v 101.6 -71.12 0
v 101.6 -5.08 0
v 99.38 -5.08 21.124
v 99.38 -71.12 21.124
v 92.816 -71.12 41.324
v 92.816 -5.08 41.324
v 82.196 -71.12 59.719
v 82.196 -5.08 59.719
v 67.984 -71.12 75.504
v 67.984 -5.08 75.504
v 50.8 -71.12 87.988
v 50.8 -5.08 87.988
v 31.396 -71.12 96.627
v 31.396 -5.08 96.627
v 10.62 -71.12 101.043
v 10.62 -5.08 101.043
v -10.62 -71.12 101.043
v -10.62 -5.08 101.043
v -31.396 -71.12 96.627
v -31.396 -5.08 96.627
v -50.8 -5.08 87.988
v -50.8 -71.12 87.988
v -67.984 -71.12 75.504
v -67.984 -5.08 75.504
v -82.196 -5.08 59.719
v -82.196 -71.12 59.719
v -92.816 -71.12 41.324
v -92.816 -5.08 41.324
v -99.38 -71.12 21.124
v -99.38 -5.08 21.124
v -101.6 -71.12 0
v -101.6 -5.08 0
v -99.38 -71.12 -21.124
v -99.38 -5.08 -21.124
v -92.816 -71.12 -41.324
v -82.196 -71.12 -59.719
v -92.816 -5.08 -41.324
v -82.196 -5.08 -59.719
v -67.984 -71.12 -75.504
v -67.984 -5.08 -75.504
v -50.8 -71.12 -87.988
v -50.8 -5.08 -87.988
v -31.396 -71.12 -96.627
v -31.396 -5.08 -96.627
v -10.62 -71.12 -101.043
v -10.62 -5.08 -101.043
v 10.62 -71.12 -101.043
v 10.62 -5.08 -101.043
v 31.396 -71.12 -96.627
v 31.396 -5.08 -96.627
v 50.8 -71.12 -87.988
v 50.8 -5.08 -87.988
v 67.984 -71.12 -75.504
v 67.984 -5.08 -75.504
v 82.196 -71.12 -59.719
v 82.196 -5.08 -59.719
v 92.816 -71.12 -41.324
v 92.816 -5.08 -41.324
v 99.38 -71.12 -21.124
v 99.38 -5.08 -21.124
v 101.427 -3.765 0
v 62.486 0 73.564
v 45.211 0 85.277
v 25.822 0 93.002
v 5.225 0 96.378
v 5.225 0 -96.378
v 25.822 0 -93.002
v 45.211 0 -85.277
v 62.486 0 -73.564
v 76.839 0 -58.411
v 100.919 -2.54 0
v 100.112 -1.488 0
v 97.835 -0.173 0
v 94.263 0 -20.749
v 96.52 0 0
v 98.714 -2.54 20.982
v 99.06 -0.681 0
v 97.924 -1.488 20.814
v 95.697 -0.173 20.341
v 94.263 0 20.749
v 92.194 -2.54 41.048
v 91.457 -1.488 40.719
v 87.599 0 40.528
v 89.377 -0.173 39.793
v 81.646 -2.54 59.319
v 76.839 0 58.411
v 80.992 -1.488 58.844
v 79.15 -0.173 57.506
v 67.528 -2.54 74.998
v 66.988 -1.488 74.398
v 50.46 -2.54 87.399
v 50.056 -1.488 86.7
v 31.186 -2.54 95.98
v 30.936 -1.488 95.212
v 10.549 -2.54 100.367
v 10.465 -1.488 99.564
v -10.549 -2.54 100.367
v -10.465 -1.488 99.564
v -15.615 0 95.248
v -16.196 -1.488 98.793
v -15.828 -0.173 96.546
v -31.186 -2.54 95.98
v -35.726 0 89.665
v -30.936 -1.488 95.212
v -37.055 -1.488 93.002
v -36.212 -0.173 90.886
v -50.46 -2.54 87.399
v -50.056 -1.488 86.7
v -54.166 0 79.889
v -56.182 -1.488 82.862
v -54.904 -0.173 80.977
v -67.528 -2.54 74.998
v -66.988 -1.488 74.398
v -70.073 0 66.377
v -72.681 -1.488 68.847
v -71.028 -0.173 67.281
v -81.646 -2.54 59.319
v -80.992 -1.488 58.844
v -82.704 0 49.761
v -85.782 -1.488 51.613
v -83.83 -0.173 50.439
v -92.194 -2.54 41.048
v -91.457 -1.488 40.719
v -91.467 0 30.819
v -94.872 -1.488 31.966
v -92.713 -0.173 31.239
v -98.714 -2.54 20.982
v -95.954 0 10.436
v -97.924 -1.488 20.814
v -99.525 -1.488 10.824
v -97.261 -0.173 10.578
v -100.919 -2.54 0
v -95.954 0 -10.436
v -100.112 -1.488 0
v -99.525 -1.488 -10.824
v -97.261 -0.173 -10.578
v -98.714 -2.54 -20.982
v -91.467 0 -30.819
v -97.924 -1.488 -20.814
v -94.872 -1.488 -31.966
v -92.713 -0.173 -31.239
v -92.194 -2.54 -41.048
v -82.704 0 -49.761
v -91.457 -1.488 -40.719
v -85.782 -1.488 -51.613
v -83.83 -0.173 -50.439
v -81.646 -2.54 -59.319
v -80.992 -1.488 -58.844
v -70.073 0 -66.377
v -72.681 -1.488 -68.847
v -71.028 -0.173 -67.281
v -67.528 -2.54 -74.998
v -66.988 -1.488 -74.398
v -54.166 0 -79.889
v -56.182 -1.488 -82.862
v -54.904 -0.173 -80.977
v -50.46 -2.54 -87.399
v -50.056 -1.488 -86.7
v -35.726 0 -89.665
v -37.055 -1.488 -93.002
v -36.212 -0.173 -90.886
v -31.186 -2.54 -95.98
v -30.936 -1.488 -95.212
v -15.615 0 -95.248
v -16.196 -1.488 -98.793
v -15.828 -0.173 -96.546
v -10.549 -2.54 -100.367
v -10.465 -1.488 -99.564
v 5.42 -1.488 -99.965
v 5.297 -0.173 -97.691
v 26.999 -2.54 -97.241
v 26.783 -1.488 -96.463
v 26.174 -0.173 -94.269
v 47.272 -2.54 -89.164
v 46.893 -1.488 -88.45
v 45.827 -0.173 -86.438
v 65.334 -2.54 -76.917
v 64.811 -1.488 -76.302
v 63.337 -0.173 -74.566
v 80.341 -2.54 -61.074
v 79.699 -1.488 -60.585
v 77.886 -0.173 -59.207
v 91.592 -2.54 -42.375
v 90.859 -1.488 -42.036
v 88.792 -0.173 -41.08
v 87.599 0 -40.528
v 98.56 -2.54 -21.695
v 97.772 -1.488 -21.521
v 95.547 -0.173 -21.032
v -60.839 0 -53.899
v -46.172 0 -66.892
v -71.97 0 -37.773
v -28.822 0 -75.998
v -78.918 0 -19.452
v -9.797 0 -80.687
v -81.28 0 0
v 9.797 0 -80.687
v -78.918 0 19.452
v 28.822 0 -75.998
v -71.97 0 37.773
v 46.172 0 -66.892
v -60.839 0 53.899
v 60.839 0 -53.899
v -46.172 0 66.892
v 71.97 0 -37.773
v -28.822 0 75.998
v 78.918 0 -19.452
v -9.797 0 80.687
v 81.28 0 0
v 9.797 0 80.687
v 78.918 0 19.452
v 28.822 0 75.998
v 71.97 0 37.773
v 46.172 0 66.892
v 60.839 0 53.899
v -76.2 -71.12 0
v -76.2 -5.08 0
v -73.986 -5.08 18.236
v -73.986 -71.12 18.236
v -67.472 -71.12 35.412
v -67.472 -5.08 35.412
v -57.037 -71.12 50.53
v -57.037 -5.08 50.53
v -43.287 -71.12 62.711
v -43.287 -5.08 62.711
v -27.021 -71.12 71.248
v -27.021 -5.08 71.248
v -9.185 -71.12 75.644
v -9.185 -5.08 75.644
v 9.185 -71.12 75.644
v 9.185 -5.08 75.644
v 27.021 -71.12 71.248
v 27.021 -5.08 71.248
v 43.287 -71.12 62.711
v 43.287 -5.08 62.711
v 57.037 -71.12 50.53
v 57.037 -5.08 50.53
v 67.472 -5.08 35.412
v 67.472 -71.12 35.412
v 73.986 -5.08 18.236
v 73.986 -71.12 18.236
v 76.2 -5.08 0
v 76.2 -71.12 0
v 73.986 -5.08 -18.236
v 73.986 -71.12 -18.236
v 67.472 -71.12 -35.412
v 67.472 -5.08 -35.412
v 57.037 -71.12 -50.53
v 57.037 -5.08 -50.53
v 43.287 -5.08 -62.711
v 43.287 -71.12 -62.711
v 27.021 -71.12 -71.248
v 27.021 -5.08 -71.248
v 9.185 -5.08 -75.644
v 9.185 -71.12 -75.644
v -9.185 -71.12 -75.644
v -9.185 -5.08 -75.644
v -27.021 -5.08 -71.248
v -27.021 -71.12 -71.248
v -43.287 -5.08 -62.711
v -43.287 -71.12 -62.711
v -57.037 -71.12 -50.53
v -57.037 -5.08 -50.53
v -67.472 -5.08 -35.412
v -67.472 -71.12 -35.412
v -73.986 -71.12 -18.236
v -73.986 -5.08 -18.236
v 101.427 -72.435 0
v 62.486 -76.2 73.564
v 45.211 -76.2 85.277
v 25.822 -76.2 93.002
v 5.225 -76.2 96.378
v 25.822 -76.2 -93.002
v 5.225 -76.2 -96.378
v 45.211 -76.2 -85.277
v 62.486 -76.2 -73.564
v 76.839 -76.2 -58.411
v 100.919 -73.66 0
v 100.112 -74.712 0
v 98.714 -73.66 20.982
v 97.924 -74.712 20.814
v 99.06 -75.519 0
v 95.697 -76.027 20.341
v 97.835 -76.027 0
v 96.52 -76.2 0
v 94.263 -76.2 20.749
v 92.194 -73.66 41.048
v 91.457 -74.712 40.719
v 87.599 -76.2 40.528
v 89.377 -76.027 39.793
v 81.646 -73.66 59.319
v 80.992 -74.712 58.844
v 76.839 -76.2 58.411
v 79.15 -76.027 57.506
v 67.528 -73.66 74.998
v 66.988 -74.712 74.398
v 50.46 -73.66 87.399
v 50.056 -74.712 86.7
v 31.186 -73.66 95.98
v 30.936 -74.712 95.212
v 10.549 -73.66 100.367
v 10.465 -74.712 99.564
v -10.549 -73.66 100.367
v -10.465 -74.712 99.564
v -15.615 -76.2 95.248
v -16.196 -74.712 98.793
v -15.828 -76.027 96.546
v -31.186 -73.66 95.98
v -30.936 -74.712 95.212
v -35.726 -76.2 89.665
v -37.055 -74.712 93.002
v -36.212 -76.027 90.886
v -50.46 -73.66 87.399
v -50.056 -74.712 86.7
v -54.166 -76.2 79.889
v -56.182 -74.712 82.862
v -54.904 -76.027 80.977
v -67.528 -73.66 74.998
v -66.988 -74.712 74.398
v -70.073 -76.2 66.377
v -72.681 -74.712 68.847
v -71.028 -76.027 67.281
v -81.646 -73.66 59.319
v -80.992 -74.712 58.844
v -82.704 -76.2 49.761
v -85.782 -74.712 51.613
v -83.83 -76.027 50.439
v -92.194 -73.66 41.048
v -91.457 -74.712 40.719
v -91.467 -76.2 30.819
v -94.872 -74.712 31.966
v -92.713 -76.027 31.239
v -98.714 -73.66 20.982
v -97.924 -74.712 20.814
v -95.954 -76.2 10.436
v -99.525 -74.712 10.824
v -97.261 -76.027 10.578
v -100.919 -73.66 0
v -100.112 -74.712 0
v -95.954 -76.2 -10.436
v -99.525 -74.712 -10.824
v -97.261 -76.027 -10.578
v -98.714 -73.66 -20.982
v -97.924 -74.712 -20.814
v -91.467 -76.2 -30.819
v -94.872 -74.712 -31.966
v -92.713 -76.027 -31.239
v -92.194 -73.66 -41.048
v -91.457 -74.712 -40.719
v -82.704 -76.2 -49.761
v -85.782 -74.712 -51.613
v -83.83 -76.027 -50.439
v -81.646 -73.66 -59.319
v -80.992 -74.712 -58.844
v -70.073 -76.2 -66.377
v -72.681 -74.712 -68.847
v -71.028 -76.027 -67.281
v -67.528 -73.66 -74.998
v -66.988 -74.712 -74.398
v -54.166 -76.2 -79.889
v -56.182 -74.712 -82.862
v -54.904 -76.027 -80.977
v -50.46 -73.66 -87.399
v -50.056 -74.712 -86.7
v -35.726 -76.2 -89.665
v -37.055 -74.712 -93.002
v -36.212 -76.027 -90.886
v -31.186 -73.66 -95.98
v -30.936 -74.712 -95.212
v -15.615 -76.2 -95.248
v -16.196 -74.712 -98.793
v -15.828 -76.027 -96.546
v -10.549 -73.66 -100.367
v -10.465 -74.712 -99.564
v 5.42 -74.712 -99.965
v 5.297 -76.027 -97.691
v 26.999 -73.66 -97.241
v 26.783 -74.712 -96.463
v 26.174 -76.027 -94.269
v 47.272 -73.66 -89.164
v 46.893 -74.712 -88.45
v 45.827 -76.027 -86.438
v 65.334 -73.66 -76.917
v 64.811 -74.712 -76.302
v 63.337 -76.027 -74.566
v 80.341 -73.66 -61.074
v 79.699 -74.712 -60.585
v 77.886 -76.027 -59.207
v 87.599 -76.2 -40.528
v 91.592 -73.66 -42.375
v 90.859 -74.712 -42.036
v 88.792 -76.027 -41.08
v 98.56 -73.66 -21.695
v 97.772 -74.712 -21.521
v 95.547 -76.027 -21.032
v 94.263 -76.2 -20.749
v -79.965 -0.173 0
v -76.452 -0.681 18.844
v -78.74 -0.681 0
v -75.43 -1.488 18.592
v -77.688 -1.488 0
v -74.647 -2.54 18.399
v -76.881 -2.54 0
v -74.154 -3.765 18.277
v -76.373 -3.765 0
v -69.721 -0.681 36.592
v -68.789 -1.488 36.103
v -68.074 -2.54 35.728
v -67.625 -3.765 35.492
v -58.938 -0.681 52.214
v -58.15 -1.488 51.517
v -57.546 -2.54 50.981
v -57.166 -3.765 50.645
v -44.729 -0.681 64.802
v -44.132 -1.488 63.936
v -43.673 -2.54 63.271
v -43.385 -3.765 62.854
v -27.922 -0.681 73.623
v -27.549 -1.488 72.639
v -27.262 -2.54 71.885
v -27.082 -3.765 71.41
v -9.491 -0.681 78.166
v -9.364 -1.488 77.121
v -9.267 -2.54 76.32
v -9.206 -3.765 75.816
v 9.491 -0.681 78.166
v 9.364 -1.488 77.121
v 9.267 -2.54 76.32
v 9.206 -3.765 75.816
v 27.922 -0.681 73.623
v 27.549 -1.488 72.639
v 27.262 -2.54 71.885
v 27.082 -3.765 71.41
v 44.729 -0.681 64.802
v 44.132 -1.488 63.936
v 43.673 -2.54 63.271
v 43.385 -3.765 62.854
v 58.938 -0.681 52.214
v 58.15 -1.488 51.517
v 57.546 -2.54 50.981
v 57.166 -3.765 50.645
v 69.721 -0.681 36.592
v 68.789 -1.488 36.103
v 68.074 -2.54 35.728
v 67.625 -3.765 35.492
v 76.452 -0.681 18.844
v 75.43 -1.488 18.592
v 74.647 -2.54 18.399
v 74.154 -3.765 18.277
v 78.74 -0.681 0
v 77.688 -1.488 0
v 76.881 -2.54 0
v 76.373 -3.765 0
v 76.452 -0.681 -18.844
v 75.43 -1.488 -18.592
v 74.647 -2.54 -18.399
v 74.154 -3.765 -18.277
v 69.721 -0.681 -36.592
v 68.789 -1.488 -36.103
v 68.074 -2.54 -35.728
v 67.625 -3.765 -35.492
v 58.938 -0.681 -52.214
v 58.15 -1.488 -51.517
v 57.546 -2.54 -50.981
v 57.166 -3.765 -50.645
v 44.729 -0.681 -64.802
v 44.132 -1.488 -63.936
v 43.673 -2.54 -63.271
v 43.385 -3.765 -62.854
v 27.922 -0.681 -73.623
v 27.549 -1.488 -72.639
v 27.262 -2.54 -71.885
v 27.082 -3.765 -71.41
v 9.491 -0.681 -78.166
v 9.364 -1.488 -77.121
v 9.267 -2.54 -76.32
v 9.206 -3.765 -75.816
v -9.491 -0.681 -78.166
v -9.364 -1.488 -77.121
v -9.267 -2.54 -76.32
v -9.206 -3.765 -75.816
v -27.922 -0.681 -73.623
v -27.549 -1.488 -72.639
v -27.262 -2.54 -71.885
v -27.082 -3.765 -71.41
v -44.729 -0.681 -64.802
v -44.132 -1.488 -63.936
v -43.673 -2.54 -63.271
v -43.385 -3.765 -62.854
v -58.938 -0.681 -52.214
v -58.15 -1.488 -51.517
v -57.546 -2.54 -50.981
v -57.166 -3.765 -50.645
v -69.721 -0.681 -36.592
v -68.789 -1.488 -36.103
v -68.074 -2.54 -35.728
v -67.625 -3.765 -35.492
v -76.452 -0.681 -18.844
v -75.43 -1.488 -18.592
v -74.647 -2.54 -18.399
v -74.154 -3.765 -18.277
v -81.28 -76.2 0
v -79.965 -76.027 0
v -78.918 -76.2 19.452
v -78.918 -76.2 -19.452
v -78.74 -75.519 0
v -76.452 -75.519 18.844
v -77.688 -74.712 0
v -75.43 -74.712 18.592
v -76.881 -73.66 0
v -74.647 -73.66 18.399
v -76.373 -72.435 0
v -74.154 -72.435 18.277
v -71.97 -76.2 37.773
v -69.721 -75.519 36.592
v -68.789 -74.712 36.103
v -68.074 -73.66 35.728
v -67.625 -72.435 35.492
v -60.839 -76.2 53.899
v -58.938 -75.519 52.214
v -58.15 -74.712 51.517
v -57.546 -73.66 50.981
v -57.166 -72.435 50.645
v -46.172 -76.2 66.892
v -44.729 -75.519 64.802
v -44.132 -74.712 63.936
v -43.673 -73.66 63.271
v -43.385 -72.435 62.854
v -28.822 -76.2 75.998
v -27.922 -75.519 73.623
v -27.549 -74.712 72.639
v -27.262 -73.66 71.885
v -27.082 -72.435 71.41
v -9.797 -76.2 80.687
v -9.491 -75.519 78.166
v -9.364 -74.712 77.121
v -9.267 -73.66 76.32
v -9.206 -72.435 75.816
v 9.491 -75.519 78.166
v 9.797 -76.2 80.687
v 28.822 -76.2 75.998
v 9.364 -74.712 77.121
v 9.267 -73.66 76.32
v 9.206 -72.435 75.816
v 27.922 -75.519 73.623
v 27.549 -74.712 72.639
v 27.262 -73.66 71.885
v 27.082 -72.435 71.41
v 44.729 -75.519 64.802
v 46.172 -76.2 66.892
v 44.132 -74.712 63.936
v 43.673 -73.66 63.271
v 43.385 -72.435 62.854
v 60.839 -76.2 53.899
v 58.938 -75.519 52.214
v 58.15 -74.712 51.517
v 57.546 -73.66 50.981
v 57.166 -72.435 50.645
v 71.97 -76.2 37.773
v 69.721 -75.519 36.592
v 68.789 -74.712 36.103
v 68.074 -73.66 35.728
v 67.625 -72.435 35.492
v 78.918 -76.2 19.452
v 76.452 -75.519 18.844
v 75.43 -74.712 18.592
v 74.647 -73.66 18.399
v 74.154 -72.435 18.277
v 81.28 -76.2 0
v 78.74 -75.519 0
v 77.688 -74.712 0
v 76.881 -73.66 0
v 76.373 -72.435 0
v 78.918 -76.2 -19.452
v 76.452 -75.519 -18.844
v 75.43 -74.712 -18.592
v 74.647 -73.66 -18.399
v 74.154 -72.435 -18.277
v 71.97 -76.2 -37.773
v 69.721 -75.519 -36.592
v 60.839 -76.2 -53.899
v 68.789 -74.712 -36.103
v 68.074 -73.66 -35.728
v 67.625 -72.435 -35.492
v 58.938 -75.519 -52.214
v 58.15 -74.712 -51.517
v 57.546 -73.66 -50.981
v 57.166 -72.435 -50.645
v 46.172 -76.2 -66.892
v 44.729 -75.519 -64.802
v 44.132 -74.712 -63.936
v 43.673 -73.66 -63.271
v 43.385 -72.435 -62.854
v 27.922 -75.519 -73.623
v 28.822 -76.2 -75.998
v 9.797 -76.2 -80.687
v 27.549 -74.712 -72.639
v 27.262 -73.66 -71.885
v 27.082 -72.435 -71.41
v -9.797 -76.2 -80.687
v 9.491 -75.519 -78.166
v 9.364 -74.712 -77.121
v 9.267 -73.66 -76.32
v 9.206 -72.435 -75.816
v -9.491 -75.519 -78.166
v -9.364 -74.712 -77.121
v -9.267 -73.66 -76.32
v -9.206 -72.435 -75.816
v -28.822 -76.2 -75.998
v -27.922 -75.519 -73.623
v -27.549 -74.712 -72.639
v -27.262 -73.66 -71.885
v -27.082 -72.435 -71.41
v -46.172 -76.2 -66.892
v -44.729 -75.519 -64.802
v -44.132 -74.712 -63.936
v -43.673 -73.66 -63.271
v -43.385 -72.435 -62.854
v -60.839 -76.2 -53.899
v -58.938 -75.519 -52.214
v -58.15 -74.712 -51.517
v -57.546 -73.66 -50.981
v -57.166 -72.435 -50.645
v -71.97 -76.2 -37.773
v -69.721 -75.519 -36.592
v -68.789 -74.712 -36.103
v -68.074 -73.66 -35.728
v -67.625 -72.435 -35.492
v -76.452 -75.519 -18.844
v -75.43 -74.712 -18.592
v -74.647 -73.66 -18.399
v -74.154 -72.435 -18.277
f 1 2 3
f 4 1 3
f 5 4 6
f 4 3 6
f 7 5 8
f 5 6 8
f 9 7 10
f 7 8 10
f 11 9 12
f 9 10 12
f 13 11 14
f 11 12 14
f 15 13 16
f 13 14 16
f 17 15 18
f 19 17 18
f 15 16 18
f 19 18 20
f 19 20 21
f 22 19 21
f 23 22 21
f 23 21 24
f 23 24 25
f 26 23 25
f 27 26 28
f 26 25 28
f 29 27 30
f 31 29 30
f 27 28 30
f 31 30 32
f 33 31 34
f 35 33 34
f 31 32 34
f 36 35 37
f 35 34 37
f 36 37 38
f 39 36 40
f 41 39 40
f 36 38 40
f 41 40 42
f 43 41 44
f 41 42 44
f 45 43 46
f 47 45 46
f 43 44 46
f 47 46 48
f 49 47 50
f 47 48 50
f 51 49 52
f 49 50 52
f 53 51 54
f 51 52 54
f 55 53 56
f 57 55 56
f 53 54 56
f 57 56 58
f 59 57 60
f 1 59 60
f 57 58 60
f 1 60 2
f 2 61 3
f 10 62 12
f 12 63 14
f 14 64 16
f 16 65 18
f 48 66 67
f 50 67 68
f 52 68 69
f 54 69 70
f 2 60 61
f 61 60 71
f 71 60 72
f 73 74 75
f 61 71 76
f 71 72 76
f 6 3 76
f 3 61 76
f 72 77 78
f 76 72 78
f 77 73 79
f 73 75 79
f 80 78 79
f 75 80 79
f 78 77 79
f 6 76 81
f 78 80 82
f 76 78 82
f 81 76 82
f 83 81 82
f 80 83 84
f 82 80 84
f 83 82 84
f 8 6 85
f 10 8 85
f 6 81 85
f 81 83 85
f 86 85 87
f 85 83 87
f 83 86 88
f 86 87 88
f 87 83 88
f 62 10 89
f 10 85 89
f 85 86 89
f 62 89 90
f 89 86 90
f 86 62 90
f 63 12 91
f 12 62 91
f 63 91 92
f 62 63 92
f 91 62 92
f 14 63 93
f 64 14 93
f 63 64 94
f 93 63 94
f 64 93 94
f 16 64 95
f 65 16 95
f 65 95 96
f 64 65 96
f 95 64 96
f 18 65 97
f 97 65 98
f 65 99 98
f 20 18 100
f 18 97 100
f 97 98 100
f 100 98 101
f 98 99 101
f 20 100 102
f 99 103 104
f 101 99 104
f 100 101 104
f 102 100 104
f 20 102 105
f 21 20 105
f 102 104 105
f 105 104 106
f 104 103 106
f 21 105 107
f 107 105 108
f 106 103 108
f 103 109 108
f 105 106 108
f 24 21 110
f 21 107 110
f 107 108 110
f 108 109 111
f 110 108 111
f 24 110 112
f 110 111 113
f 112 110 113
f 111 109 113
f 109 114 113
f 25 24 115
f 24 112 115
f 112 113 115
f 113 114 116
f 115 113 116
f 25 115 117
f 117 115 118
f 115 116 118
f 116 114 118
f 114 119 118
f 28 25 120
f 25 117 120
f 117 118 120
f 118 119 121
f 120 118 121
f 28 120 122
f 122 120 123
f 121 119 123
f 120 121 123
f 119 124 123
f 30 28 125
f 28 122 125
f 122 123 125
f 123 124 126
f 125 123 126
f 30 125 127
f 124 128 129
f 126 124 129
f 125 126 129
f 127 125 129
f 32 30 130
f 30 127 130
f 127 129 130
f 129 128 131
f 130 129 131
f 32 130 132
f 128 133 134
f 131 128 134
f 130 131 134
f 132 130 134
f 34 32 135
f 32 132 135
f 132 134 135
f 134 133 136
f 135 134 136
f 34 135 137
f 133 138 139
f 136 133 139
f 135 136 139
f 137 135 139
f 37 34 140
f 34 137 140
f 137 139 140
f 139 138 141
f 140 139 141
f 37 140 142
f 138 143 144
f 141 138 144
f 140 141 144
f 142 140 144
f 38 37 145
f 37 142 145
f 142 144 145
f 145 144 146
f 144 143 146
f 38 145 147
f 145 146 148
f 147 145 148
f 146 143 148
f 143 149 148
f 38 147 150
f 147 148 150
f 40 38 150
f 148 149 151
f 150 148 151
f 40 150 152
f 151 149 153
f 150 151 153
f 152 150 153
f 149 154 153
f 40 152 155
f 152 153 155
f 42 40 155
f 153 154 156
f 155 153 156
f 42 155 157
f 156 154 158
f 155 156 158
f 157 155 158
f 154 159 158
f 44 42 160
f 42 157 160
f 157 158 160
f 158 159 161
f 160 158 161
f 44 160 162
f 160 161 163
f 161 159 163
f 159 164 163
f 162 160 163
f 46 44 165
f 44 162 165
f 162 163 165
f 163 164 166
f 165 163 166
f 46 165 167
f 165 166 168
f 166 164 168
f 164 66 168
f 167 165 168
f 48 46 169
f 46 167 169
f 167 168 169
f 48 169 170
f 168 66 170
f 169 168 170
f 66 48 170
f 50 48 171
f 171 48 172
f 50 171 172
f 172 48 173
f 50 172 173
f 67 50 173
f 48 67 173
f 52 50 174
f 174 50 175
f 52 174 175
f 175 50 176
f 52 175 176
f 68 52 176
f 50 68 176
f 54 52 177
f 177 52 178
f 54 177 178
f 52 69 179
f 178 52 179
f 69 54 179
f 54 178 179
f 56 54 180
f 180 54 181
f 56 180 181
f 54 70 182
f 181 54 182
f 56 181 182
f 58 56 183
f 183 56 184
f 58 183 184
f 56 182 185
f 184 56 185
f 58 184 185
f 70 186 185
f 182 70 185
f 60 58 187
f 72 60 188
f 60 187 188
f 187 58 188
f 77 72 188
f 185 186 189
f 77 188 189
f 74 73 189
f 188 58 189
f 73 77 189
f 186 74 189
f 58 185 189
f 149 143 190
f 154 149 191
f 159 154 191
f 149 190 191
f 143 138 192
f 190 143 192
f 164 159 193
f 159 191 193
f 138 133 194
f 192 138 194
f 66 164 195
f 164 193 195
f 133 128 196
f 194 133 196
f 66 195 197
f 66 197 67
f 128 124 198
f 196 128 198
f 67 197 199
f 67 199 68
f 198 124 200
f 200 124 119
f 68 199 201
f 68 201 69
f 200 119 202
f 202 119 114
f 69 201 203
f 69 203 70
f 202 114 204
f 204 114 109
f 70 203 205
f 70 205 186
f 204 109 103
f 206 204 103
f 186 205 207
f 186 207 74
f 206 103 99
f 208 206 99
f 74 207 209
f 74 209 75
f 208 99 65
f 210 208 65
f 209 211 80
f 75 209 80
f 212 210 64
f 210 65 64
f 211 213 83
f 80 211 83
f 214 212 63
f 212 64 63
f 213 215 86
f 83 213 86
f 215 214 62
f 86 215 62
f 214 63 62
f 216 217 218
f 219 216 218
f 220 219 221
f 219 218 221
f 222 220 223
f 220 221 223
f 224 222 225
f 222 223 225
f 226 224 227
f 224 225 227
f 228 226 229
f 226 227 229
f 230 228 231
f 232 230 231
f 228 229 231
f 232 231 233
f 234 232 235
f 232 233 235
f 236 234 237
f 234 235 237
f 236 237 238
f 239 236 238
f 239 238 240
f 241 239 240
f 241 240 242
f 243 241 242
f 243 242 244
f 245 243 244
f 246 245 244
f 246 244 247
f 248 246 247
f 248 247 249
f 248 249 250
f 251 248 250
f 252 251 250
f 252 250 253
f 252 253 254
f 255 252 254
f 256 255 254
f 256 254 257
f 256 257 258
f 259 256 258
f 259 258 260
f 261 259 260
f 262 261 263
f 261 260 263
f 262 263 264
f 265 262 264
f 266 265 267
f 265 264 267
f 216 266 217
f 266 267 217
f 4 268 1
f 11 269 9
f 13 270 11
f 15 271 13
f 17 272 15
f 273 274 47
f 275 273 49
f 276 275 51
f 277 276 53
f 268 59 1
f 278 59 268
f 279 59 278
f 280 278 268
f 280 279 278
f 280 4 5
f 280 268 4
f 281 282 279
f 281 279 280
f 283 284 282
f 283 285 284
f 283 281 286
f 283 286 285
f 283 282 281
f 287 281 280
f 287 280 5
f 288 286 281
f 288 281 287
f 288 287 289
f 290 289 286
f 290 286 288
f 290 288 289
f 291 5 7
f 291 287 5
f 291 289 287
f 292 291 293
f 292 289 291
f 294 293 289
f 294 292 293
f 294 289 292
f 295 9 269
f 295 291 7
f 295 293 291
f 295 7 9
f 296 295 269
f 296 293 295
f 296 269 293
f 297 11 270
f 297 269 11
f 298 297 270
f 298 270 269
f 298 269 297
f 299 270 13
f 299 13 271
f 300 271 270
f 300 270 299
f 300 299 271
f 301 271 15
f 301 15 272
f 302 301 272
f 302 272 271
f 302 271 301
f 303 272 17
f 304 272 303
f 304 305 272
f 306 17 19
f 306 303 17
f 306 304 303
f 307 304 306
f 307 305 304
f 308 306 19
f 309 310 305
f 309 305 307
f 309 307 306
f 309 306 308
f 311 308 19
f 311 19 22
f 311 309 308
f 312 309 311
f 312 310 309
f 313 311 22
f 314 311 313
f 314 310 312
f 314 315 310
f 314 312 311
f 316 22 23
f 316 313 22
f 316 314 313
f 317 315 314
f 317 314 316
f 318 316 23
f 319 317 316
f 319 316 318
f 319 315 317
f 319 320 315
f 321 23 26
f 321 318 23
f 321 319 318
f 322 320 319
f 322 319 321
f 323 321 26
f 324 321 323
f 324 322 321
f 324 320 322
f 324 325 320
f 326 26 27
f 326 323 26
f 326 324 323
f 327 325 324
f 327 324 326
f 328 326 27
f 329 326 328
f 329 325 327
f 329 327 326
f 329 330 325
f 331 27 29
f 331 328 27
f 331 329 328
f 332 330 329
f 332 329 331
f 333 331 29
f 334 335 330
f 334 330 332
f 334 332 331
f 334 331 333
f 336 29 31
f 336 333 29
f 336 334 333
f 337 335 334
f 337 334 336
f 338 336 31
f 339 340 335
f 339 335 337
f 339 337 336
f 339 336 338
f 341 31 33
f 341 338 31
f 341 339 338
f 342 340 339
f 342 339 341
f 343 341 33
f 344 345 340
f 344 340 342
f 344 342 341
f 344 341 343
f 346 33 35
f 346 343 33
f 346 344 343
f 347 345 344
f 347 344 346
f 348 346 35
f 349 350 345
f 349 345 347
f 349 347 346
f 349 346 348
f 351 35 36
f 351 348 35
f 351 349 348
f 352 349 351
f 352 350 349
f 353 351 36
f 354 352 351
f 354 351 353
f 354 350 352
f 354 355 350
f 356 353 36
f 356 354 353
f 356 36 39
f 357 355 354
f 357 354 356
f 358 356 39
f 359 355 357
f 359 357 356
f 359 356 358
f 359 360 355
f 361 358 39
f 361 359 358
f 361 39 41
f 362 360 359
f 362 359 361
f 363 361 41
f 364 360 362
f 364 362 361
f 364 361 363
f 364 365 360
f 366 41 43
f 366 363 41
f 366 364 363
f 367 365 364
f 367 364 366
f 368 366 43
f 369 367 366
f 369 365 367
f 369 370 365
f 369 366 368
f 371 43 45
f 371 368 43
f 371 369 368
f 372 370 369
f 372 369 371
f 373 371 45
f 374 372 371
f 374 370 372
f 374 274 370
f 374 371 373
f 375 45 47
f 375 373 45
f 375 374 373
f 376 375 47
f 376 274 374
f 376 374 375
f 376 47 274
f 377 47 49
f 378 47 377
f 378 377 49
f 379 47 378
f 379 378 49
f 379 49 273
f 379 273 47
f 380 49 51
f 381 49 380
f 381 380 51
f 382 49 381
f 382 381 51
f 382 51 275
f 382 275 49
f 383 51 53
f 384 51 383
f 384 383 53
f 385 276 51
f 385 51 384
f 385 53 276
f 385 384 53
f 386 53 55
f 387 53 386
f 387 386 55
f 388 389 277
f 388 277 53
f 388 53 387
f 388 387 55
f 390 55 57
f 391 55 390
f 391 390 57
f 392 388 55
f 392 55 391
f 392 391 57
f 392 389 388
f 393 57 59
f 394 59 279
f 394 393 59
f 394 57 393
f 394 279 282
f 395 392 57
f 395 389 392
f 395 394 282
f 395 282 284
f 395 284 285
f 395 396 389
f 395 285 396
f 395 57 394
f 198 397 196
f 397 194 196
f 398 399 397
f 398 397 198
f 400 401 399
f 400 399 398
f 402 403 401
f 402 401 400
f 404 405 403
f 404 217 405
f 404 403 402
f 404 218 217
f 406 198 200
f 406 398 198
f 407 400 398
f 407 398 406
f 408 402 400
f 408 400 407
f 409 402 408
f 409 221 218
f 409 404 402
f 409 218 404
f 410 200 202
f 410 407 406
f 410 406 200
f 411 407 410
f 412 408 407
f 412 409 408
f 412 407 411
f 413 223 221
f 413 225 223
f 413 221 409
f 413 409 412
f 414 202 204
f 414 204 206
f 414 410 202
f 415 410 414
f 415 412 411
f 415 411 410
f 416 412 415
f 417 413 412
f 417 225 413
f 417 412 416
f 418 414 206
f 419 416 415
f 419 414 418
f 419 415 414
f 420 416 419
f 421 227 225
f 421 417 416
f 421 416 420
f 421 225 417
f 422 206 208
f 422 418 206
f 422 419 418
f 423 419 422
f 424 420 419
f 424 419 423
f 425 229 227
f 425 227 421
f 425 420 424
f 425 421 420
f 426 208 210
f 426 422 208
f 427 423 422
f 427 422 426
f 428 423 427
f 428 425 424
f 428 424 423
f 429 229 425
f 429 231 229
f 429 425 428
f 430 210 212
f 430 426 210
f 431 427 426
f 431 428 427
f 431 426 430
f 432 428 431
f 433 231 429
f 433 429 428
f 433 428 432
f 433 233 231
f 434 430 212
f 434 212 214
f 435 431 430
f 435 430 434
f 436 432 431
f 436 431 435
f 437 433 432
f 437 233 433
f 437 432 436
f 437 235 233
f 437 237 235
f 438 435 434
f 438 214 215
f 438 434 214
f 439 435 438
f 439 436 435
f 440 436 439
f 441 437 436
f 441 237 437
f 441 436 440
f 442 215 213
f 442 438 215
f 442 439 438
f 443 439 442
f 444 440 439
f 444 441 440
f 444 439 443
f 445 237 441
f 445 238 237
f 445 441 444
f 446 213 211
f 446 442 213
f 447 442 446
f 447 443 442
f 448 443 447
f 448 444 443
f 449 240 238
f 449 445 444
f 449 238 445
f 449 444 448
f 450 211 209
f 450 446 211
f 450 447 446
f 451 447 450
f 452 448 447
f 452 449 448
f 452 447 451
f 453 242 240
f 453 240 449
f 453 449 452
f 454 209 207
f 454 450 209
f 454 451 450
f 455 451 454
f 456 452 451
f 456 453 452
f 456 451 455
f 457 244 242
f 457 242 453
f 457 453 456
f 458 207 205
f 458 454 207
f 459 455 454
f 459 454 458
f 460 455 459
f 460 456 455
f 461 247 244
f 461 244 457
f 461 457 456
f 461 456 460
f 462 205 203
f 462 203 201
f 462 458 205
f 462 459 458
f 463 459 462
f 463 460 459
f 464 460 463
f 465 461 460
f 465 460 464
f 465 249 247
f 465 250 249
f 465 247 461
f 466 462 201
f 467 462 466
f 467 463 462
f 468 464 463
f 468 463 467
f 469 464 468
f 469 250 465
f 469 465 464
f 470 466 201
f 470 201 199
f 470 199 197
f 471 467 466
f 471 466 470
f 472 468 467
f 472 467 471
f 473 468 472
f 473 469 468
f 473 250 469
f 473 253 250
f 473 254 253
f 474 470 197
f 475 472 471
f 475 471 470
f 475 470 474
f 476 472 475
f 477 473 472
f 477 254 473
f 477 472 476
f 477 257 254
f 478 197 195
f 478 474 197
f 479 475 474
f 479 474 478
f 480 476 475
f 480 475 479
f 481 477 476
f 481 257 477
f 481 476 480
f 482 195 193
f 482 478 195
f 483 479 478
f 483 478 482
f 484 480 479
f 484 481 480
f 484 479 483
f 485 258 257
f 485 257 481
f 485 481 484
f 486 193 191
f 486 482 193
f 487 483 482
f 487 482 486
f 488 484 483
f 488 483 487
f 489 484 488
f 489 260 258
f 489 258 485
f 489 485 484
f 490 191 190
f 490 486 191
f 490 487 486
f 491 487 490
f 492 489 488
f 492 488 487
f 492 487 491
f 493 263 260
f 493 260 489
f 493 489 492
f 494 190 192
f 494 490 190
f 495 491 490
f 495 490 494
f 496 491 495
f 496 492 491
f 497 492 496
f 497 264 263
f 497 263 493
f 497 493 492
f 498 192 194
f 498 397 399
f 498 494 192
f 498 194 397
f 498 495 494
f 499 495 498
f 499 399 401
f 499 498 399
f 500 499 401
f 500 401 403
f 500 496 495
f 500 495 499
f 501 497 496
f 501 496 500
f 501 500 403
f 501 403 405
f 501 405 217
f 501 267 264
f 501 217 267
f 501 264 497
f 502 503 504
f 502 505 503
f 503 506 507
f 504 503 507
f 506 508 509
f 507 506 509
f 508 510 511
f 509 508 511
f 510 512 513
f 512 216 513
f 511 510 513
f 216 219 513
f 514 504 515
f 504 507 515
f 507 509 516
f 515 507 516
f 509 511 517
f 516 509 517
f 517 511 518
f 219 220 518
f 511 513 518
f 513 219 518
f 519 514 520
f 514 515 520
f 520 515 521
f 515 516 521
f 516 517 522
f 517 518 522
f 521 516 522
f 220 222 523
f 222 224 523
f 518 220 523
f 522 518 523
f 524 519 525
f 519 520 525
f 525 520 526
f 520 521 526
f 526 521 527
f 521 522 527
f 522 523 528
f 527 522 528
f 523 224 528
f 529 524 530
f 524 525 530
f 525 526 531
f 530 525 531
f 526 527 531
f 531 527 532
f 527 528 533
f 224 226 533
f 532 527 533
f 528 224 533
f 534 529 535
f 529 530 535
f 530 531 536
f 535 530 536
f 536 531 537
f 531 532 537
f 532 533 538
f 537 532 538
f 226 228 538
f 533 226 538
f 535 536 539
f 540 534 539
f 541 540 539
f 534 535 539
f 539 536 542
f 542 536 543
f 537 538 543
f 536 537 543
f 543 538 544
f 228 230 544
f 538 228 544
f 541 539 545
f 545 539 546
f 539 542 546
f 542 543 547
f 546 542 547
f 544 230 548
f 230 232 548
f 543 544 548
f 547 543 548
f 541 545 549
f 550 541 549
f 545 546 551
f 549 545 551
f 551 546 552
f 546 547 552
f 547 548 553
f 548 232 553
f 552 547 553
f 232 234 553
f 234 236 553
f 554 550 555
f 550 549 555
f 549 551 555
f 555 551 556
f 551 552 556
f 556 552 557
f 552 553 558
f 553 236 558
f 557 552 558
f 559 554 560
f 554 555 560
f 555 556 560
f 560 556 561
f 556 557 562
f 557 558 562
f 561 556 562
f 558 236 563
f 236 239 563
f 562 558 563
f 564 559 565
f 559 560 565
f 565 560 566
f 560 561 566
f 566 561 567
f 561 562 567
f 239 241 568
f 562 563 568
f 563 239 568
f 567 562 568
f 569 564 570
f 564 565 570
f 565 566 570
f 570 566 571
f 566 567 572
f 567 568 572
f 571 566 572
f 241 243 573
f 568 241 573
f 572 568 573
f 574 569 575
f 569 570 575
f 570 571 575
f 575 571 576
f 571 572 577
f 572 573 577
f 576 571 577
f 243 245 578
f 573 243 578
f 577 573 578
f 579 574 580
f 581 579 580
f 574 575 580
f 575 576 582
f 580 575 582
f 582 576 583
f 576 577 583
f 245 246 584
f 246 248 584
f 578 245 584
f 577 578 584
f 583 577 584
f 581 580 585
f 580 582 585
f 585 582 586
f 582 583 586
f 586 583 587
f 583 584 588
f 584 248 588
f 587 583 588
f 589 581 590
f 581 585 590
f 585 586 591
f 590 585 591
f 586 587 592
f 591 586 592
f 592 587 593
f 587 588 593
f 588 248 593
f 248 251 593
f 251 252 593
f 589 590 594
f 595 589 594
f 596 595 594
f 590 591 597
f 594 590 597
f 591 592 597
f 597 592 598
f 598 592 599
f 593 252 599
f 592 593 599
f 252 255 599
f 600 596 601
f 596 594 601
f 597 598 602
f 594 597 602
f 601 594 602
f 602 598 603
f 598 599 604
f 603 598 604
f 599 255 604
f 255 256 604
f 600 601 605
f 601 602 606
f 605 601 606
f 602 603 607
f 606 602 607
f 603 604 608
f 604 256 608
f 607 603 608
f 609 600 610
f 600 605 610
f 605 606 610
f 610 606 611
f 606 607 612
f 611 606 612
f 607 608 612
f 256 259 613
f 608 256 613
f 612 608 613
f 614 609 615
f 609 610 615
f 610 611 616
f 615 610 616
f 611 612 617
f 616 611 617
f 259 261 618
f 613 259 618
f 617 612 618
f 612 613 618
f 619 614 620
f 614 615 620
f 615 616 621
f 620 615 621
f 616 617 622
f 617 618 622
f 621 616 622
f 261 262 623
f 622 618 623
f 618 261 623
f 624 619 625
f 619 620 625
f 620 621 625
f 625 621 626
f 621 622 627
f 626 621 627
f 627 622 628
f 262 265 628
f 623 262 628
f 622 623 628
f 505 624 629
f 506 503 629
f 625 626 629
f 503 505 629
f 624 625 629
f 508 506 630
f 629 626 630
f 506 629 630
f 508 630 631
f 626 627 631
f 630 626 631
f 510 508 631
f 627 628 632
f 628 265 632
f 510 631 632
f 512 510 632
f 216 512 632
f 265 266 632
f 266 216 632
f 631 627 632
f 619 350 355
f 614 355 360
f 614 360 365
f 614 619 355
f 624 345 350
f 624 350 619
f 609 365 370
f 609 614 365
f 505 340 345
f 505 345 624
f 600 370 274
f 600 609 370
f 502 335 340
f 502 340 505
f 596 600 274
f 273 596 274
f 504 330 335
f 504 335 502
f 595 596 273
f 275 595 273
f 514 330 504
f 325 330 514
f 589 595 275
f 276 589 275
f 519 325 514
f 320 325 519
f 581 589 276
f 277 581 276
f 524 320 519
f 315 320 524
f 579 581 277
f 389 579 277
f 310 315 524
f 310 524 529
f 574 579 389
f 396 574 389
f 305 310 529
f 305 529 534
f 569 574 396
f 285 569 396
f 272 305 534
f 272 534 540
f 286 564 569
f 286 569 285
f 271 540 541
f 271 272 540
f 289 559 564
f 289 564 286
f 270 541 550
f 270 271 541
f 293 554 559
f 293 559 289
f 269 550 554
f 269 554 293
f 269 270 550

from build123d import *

# Parameters (mm, degrees)
F0_R     = 101.6
F1_DEPTH = 76.2
F3_D     = 152.4
F4_R     = 5.08


with BuildPart() as f1:
    # F0 (on Front) → F1 (new body)
    with BuildSketch(Plane.XZ):
        Circle(F0_R)
    extrude(amount=F1_DEPTH)

    # F3 (through all)
    with Locations(Plane.XZ.offset(76.2)):
        with Locations((0, 0)):
            Hole(F3_D / 2)

    # F4
    f4_edges = [f1.edges().sort_by_distance(p)[0] for p in [
        (-101.6, -76.2, 0),
        (-101.6, 0, 0),
        (-76.2, 0, 0),
        (-76.2, -76.2, 0),
    ]]
    fillet(f4_edges, radius=F4_R)


solid = f1.part
